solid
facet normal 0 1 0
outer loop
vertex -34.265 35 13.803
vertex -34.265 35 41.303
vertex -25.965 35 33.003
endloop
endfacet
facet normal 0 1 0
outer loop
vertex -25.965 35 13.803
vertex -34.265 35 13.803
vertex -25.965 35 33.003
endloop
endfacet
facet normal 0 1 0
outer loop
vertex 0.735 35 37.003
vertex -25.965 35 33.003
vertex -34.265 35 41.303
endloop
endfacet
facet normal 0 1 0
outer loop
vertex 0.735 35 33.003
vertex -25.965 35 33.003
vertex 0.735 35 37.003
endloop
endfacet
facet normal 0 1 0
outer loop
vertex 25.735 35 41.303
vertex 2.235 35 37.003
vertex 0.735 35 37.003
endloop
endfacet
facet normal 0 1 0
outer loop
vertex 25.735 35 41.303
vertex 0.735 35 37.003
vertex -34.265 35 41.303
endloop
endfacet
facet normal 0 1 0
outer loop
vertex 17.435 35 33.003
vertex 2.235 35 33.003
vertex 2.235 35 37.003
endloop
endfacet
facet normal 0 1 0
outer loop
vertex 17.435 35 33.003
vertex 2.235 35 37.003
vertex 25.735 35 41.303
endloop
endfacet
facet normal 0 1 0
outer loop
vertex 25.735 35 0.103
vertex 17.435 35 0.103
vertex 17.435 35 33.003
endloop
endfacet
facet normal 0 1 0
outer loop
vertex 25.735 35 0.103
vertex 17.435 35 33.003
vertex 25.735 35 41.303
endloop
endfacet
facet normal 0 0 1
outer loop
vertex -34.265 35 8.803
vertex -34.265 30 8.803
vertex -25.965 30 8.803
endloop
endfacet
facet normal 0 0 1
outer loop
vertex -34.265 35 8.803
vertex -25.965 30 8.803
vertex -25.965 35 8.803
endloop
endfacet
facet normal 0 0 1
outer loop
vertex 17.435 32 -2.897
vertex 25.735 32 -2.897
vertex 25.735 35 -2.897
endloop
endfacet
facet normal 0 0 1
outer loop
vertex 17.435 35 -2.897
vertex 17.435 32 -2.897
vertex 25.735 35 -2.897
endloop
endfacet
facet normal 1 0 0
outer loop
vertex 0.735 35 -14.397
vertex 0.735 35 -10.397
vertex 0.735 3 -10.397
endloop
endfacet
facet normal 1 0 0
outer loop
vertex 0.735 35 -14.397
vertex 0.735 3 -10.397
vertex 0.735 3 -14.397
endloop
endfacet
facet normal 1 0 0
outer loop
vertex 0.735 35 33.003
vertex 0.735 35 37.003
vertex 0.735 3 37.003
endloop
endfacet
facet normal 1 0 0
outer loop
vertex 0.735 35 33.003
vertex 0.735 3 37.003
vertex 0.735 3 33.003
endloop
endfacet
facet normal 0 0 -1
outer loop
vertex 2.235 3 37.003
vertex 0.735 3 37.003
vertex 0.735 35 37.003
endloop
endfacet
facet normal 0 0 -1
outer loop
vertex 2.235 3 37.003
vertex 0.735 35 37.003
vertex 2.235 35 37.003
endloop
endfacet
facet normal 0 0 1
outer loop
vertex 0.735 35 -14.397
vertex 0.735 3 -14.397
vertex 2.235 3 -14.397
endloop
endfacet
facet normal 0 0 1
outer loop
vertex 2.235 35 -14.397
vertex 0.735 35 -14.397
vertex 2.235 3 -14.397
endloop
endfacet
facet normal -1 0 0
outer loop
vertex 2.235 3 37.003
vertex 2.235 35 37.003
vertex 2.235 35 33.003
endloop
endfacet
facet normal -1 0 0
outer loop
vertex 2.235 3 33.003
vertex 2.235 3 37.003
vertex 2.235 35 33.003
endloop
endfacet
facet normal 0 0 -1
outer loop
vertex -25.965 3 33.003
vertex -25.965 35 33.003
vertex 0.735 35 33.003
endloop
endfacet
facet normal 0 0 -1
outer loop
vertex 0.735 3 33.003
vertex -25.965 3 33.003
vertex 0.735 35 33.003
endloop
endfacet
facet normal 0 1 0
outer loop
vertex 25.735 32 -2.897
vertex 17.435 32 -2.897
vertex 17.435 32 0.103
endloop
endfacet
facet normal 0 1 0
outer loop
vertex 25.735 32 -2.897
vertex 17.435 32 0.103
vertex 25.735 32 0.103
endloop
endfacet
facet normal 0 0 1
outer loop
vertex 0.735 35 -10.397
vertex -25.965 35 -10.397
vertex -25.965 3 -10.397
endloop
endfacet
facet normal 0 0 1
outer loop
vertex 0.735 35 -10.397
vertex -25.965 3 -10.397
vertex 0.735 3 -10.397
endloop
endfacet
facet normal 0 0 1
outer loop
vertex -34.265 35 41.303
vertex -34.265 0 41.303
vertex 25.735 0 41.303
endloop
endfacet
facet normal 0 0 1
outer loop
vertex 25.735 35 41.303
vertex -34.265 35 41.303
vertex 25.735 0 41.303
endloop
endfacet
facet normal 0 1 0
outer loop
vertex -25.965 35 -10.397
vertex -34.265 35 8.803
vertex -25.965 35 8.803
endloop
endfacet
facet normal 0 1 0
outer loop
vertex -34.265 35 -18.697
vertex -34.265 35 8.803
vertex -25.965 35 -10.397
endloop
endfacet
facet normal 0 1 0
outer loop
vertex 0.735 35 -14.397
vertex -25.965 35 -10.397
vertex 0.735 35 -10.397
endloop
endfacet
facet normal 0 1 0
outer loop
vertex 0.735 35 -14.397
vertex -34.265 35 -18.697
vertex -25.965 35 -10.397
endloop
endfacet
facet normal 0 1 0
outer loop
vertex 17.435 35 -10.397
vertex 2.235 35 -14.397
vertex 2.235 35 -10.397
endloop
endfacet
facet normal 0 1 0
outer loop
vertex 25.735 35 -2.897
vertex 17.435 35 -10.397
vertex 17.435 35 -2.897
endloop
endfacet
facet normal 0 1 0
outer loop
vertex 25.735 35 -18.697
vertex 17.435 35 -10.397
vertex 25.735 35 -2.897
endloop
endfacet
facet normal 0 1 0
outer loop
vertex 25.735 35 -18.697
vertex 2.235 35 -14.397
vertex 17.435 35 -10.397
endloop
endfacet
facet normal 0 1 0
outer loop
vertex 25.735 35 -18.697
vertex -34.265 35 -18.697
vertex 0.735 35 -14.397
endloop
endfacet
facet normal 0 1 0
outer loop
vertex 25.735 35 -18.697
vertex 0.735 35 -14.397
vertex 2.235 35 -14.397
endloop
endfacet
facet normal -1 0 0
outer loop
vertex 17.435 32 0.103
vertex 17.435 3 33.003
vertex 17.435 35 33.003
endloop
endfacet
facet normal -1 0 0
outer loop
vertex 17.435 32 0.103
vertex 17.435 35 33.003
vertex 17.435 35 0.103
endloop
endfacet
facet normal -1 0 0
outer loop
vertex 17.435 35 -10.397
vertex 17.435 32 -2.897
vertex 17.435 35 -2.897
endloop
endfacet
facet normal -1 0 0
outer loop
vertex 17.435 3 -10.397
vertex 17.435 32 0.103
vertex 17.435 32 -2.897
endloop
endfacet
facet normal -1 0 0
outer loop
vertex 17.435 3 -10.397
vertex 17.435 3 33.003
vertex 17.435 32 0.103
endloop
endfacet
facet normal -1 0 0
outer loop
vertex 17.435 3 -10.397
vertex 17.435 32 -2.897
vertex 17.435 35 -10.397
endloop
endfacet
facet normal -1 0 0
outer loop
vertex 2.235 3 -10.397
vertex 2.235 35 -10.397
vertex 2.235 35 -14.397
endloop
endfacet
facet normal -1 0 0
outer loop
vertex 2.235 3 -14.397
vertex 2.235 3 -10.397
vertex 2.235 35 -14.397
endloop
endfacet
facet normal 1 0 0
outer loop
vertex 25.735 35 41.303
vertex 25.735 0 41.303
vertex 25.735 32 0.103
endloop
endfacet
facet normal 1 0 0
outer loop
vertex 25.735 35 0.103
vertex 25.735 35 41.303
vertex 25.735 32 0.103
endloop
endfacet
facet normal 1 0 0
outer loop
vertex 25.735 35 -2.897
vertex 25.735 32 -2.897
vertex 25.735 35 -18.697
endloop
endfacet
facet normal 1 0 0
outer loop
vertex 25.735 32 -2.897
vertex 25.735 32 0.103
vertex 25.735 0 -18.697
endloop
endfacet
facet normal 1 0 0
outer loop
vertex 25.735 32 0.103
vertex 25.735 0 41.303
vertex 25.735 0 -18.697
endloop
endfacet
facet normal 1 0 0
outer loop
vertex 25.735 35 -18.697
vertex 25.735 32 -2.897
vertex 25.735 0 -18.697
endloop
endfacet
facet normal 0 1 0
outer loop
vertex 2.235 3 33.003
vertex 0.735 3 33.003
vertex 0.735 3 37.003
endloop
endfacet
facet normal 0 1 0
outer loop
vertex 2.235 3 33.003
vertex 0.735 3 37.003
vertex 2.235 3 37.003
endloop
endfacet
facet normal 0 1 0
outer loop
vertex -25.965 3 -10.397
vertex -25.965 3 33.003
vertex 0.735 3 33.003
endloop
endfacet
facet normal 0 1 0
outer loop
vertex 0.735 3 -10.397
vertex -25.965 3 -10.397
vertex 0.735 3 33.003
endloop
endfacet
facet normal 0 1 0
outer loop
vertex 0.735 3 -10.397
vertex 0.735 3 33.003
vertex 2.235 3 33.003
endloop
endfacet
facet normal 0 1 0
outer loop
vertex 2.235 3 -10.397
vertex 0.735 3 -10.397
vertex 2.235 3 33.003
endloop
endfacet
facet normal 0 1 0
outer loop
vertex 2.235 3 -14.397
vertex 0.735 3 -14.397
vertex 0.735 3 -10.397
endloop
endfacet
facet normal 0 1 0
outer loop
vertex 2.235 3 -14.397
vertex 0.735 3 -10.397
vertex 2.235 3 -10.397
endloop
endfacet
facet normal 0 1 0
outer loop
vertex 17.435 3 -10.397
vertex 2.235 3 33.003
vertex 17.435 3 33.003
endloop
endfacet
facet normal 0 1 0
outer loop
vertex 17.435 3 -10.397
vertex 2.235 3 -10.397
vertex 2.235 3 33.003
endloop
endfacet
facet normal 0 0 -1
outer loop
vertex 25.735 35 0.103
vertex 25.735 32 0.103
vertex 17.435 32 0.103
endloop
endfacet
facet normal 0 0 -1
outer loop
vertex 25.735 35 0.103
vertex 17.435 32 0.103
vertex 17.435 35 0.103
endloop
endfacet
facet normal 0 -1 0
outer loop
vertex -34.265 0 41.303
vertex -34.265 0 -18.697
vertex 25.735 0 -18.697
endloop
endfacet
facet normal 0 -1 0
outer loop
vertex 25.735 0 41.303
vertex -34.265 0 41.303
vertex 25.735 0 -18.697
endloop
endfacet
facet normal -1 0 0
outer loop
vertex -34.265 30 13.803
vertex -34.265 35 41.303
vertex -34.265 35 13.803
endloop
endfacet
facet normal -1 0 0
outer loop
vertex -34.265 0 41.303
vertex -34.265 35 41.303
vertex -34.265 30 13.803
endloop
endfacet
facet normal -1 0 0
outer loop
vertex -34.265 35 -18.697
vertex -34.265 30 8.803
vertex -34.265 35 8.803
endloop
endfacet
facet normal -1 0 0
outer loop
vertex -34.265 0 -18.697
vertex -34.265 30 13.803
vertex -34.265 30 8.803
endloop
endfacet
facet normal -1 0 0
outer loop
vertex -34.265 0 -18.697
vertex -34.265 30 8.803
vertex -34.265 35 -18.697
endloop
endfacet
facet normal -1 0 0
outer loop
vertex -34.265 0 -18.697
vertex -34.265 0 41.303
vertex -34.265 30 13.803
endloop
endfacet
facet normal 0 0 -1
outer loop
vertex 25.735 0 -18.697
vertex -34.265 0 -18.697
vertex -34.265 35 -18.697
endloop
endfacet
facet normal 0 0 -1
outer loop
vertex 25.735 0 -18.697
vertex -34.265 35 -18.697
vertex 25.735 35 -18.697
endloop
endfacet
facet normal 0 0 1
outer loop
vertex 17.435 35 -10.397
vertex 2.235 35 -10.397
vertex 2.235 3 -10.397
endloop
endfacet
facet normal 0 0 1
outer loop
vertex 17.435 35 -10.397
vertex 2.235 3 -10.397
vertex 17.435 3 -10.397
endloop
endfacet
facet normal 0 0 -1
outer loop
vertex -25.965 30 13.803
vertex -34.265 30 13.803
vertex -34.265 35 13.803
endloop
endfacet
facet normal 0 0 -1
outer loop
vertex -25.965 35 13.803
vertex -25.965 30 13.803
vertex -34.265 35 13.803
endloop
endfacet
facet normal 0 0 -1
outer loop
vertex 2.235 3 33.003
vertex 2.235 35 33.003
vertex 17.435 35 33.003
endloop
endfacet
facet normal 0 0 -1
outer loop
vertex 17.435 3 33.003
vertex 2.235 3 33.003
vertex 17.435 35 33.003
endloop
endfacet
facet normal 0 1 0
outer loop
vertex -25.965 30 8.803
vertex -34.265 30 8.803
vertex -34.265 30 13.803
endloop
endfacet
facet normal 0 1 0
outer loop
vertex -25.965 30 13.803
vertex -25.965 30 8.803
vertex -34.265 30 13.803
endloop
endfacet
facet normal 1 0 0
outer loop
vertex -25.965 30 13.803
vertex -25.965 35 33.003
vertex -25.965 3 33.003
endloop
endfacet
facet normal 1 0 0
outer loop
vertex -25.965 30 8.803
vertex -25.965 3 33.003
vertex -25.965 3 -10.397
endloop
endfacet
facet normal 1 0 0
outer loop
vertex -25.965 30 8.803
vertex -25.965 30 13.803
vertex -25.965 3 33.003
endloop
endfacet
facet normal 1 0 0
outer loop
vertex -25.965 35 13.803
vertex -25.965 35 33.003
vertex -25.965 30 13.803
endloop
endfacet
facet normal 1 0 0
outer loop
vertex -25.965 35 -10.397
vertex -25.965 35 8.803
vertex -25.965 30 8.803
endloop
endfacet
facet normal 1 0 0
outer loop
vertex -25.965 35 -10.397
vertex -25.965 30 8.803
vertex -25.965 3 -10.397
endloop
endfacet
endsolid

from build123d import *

# Parameters (mm, degrees)
SKETCH1_W           = 60
SKETCH1_H           = 60
BOSS_EXTRUDE1_DEPTH = 35
SKETCH2_W           = 43.4
SKETCH2_H           = 43.4
CUT_EXTRUDE1_DEPTH  = 32
SKETCH3_W           = 1.5
SKETCH3_H           = 4
CUT_EXTRUDE4_DEPTH  = 32
SKETCH7_W           = 3.5
SKETCH7_H           = 3.5
CUT_EXTRUDE7_DEPTH  = 76
BOSS_EXTRUDE4_DEPTH = 8.3
BOSS_EXTRUDE5_DEPTH = 8.3
SKETCH13_W          = 3
SKETCH13_H          = 3
CUT_EXTRUDE8_DEPTH  = 8.3
SKETCH15_W          = 3
SKETCH15_H          = 1.2
CUT_EXTRUDE9_DEPTH  = 10
SKETCH18_W          = 8.3
SKETCH18_H          = 3
BOSS_EXTRUDE7_DEPTH = 1.2
SKETCH19_W          = 5
SKETCH19_H          = 5
CUT_EXTRUDE10_DEPTH = 11.2


with BuildPart() as part:
    # Sketch1 → Boss-Extrude1 (new body)
    with BuildSketch(Plane(origin=(0, 0, 0), x_dir=(1, 0, 0), z_dir=(0, 1, 0))):
        with Locations((-4.265402844, -11.303317536)):
            Rectangle(SKETCH1_W, SKETCH1_H)
    extrude(amount=BOSS_EXTRUDE1_DEPTH)

    # Sketch2 → Cut-Extrude1 (cut)
    with BuildSketch(Plane(origin=(0, 35, 0), x_dir=(1, 0, 0), z_dir=(0, 1, 0))):
        with Locations((-4.265402844, -11.303317536)):
            Rectangle(SKETCH2_W, SKETCH2_H)
    extrude(amount=-CUT_EXTRUDE1_DEPTH, mode=Mode.SUBTRACT)

    # Sketch3 → Cut-Extrude4 (cut)
    with BuildSketch(Plane(origin=(0, 3, 0), x_dir=(1, 0, 0), z_dir=(0, 1, 0))):
        with Locations((1.484597156, 12.396682464)):
            Rectangle(SKETCH3_W, SKETCH3_H)
        with Locations((1.484597156, -35.003317536)):
            Rectangle(SKETCH3_W, SKETCH3_H)
    extrude(amount=CUT_EXTRUDE4_DEPTH, mode=Mode.SUBTRACT)

    # Sketch7 → Cut-Extrude7 (cut)
    with BuildSketch(Plane.ZY.offset(34.265402844)):
        with Locations((-5.246682464, 30.75)):
            Rectangle(SKETCH7_W, SKETCH7_H)
    extrude(amount=-CUT_EXTRUDE7_DEPTH, mode=Mode.SUBTRACT)

    # Sketch9 → Boss-Extrude4 (add)
    with BuildSketch(Plane(origin=(25.734597156, 0, 0), x_dir=(0, 0, -1), z_dir=(1, 0, 0))):
        Polygon((3.496682464, 33.408360871), (7.381092644, 33.408360871), (7.381092644, 28.341399858), (2.785501873, 28.341399858), (2.785501873, 33.408360871), align=None)
    extrude(amount=-BOSS_EXTRUDE4_DEPTH)

    # Sketch12 → Boss-Extrude5 (add)
    with BuildSketch(Plane.ZY.offset(34.265402844)):
        Polygon((-6.996682464, 33.539678427), (-3.311731013, 33.539678427), (-3.311731013, 28.43958096), (-8.388325726, 28.43958096), (-8.388325726, 33.539678427), align=None)
    extrude(amount=-BOSS_EXTRUDE5_DEPTH)

    # Sketch13 → Cut-Extrude8 (cut)
    with BuildSketch(Plane(origin=(25.734597156, 0, 0), x_dir=(0, 0, -1), z_dir=(1, 0, 0))):
        with Locations((1.396682464, 32.3)):
            Rectangle(SKETCH13_W, SKETCH13_H)
    extrude(amount=-CUT_EXTRUDE8_DEPTH, mode=Mode.SUBTRACT)

    # Sketch15 → Cut-Extrude9 (cut)
    with BuildSketch(Plane(origin=(25.734597156, 0, 0), x_dir=(0, 0, -1), z_dir=(1, 0, 0))):
        with Locations((1.396682464, 34.4)):
            Rectangle(SKETCH15_W, SKETCH15_H)
    extrude(amount=-CUT_EXTRUDE9_DEPTH, mode=Mode.SUBTRACT)

    # Sketch18 → Boss-Extrude7 (add)
    with BuildSketch(Plane(origin=(0, 30.8, 0), x_dir=(1, 0, 0), z_dir=(0, 1, 0))):
        with Locations((21.584597156, 1.396682464)):
            Rectangle(SKETCH18_W, SKETCH18_H)
    extrude(amount=BOSS_EXTRUDE7_DEPTH)

    # Sketch19 → Cut-Extrude10 (cut)
    with BuildSketch(Plane.ZY.offset(34.265402844)):
        with Locations((11.303317536, 32.5)):
            Rectangle(SKETCH19_W, SKETCH19_H)
    extrude(amount=-CUT_EXTRUDE10_DEPTH, mode=Mode.SUBTRACT)


solid = part.part
